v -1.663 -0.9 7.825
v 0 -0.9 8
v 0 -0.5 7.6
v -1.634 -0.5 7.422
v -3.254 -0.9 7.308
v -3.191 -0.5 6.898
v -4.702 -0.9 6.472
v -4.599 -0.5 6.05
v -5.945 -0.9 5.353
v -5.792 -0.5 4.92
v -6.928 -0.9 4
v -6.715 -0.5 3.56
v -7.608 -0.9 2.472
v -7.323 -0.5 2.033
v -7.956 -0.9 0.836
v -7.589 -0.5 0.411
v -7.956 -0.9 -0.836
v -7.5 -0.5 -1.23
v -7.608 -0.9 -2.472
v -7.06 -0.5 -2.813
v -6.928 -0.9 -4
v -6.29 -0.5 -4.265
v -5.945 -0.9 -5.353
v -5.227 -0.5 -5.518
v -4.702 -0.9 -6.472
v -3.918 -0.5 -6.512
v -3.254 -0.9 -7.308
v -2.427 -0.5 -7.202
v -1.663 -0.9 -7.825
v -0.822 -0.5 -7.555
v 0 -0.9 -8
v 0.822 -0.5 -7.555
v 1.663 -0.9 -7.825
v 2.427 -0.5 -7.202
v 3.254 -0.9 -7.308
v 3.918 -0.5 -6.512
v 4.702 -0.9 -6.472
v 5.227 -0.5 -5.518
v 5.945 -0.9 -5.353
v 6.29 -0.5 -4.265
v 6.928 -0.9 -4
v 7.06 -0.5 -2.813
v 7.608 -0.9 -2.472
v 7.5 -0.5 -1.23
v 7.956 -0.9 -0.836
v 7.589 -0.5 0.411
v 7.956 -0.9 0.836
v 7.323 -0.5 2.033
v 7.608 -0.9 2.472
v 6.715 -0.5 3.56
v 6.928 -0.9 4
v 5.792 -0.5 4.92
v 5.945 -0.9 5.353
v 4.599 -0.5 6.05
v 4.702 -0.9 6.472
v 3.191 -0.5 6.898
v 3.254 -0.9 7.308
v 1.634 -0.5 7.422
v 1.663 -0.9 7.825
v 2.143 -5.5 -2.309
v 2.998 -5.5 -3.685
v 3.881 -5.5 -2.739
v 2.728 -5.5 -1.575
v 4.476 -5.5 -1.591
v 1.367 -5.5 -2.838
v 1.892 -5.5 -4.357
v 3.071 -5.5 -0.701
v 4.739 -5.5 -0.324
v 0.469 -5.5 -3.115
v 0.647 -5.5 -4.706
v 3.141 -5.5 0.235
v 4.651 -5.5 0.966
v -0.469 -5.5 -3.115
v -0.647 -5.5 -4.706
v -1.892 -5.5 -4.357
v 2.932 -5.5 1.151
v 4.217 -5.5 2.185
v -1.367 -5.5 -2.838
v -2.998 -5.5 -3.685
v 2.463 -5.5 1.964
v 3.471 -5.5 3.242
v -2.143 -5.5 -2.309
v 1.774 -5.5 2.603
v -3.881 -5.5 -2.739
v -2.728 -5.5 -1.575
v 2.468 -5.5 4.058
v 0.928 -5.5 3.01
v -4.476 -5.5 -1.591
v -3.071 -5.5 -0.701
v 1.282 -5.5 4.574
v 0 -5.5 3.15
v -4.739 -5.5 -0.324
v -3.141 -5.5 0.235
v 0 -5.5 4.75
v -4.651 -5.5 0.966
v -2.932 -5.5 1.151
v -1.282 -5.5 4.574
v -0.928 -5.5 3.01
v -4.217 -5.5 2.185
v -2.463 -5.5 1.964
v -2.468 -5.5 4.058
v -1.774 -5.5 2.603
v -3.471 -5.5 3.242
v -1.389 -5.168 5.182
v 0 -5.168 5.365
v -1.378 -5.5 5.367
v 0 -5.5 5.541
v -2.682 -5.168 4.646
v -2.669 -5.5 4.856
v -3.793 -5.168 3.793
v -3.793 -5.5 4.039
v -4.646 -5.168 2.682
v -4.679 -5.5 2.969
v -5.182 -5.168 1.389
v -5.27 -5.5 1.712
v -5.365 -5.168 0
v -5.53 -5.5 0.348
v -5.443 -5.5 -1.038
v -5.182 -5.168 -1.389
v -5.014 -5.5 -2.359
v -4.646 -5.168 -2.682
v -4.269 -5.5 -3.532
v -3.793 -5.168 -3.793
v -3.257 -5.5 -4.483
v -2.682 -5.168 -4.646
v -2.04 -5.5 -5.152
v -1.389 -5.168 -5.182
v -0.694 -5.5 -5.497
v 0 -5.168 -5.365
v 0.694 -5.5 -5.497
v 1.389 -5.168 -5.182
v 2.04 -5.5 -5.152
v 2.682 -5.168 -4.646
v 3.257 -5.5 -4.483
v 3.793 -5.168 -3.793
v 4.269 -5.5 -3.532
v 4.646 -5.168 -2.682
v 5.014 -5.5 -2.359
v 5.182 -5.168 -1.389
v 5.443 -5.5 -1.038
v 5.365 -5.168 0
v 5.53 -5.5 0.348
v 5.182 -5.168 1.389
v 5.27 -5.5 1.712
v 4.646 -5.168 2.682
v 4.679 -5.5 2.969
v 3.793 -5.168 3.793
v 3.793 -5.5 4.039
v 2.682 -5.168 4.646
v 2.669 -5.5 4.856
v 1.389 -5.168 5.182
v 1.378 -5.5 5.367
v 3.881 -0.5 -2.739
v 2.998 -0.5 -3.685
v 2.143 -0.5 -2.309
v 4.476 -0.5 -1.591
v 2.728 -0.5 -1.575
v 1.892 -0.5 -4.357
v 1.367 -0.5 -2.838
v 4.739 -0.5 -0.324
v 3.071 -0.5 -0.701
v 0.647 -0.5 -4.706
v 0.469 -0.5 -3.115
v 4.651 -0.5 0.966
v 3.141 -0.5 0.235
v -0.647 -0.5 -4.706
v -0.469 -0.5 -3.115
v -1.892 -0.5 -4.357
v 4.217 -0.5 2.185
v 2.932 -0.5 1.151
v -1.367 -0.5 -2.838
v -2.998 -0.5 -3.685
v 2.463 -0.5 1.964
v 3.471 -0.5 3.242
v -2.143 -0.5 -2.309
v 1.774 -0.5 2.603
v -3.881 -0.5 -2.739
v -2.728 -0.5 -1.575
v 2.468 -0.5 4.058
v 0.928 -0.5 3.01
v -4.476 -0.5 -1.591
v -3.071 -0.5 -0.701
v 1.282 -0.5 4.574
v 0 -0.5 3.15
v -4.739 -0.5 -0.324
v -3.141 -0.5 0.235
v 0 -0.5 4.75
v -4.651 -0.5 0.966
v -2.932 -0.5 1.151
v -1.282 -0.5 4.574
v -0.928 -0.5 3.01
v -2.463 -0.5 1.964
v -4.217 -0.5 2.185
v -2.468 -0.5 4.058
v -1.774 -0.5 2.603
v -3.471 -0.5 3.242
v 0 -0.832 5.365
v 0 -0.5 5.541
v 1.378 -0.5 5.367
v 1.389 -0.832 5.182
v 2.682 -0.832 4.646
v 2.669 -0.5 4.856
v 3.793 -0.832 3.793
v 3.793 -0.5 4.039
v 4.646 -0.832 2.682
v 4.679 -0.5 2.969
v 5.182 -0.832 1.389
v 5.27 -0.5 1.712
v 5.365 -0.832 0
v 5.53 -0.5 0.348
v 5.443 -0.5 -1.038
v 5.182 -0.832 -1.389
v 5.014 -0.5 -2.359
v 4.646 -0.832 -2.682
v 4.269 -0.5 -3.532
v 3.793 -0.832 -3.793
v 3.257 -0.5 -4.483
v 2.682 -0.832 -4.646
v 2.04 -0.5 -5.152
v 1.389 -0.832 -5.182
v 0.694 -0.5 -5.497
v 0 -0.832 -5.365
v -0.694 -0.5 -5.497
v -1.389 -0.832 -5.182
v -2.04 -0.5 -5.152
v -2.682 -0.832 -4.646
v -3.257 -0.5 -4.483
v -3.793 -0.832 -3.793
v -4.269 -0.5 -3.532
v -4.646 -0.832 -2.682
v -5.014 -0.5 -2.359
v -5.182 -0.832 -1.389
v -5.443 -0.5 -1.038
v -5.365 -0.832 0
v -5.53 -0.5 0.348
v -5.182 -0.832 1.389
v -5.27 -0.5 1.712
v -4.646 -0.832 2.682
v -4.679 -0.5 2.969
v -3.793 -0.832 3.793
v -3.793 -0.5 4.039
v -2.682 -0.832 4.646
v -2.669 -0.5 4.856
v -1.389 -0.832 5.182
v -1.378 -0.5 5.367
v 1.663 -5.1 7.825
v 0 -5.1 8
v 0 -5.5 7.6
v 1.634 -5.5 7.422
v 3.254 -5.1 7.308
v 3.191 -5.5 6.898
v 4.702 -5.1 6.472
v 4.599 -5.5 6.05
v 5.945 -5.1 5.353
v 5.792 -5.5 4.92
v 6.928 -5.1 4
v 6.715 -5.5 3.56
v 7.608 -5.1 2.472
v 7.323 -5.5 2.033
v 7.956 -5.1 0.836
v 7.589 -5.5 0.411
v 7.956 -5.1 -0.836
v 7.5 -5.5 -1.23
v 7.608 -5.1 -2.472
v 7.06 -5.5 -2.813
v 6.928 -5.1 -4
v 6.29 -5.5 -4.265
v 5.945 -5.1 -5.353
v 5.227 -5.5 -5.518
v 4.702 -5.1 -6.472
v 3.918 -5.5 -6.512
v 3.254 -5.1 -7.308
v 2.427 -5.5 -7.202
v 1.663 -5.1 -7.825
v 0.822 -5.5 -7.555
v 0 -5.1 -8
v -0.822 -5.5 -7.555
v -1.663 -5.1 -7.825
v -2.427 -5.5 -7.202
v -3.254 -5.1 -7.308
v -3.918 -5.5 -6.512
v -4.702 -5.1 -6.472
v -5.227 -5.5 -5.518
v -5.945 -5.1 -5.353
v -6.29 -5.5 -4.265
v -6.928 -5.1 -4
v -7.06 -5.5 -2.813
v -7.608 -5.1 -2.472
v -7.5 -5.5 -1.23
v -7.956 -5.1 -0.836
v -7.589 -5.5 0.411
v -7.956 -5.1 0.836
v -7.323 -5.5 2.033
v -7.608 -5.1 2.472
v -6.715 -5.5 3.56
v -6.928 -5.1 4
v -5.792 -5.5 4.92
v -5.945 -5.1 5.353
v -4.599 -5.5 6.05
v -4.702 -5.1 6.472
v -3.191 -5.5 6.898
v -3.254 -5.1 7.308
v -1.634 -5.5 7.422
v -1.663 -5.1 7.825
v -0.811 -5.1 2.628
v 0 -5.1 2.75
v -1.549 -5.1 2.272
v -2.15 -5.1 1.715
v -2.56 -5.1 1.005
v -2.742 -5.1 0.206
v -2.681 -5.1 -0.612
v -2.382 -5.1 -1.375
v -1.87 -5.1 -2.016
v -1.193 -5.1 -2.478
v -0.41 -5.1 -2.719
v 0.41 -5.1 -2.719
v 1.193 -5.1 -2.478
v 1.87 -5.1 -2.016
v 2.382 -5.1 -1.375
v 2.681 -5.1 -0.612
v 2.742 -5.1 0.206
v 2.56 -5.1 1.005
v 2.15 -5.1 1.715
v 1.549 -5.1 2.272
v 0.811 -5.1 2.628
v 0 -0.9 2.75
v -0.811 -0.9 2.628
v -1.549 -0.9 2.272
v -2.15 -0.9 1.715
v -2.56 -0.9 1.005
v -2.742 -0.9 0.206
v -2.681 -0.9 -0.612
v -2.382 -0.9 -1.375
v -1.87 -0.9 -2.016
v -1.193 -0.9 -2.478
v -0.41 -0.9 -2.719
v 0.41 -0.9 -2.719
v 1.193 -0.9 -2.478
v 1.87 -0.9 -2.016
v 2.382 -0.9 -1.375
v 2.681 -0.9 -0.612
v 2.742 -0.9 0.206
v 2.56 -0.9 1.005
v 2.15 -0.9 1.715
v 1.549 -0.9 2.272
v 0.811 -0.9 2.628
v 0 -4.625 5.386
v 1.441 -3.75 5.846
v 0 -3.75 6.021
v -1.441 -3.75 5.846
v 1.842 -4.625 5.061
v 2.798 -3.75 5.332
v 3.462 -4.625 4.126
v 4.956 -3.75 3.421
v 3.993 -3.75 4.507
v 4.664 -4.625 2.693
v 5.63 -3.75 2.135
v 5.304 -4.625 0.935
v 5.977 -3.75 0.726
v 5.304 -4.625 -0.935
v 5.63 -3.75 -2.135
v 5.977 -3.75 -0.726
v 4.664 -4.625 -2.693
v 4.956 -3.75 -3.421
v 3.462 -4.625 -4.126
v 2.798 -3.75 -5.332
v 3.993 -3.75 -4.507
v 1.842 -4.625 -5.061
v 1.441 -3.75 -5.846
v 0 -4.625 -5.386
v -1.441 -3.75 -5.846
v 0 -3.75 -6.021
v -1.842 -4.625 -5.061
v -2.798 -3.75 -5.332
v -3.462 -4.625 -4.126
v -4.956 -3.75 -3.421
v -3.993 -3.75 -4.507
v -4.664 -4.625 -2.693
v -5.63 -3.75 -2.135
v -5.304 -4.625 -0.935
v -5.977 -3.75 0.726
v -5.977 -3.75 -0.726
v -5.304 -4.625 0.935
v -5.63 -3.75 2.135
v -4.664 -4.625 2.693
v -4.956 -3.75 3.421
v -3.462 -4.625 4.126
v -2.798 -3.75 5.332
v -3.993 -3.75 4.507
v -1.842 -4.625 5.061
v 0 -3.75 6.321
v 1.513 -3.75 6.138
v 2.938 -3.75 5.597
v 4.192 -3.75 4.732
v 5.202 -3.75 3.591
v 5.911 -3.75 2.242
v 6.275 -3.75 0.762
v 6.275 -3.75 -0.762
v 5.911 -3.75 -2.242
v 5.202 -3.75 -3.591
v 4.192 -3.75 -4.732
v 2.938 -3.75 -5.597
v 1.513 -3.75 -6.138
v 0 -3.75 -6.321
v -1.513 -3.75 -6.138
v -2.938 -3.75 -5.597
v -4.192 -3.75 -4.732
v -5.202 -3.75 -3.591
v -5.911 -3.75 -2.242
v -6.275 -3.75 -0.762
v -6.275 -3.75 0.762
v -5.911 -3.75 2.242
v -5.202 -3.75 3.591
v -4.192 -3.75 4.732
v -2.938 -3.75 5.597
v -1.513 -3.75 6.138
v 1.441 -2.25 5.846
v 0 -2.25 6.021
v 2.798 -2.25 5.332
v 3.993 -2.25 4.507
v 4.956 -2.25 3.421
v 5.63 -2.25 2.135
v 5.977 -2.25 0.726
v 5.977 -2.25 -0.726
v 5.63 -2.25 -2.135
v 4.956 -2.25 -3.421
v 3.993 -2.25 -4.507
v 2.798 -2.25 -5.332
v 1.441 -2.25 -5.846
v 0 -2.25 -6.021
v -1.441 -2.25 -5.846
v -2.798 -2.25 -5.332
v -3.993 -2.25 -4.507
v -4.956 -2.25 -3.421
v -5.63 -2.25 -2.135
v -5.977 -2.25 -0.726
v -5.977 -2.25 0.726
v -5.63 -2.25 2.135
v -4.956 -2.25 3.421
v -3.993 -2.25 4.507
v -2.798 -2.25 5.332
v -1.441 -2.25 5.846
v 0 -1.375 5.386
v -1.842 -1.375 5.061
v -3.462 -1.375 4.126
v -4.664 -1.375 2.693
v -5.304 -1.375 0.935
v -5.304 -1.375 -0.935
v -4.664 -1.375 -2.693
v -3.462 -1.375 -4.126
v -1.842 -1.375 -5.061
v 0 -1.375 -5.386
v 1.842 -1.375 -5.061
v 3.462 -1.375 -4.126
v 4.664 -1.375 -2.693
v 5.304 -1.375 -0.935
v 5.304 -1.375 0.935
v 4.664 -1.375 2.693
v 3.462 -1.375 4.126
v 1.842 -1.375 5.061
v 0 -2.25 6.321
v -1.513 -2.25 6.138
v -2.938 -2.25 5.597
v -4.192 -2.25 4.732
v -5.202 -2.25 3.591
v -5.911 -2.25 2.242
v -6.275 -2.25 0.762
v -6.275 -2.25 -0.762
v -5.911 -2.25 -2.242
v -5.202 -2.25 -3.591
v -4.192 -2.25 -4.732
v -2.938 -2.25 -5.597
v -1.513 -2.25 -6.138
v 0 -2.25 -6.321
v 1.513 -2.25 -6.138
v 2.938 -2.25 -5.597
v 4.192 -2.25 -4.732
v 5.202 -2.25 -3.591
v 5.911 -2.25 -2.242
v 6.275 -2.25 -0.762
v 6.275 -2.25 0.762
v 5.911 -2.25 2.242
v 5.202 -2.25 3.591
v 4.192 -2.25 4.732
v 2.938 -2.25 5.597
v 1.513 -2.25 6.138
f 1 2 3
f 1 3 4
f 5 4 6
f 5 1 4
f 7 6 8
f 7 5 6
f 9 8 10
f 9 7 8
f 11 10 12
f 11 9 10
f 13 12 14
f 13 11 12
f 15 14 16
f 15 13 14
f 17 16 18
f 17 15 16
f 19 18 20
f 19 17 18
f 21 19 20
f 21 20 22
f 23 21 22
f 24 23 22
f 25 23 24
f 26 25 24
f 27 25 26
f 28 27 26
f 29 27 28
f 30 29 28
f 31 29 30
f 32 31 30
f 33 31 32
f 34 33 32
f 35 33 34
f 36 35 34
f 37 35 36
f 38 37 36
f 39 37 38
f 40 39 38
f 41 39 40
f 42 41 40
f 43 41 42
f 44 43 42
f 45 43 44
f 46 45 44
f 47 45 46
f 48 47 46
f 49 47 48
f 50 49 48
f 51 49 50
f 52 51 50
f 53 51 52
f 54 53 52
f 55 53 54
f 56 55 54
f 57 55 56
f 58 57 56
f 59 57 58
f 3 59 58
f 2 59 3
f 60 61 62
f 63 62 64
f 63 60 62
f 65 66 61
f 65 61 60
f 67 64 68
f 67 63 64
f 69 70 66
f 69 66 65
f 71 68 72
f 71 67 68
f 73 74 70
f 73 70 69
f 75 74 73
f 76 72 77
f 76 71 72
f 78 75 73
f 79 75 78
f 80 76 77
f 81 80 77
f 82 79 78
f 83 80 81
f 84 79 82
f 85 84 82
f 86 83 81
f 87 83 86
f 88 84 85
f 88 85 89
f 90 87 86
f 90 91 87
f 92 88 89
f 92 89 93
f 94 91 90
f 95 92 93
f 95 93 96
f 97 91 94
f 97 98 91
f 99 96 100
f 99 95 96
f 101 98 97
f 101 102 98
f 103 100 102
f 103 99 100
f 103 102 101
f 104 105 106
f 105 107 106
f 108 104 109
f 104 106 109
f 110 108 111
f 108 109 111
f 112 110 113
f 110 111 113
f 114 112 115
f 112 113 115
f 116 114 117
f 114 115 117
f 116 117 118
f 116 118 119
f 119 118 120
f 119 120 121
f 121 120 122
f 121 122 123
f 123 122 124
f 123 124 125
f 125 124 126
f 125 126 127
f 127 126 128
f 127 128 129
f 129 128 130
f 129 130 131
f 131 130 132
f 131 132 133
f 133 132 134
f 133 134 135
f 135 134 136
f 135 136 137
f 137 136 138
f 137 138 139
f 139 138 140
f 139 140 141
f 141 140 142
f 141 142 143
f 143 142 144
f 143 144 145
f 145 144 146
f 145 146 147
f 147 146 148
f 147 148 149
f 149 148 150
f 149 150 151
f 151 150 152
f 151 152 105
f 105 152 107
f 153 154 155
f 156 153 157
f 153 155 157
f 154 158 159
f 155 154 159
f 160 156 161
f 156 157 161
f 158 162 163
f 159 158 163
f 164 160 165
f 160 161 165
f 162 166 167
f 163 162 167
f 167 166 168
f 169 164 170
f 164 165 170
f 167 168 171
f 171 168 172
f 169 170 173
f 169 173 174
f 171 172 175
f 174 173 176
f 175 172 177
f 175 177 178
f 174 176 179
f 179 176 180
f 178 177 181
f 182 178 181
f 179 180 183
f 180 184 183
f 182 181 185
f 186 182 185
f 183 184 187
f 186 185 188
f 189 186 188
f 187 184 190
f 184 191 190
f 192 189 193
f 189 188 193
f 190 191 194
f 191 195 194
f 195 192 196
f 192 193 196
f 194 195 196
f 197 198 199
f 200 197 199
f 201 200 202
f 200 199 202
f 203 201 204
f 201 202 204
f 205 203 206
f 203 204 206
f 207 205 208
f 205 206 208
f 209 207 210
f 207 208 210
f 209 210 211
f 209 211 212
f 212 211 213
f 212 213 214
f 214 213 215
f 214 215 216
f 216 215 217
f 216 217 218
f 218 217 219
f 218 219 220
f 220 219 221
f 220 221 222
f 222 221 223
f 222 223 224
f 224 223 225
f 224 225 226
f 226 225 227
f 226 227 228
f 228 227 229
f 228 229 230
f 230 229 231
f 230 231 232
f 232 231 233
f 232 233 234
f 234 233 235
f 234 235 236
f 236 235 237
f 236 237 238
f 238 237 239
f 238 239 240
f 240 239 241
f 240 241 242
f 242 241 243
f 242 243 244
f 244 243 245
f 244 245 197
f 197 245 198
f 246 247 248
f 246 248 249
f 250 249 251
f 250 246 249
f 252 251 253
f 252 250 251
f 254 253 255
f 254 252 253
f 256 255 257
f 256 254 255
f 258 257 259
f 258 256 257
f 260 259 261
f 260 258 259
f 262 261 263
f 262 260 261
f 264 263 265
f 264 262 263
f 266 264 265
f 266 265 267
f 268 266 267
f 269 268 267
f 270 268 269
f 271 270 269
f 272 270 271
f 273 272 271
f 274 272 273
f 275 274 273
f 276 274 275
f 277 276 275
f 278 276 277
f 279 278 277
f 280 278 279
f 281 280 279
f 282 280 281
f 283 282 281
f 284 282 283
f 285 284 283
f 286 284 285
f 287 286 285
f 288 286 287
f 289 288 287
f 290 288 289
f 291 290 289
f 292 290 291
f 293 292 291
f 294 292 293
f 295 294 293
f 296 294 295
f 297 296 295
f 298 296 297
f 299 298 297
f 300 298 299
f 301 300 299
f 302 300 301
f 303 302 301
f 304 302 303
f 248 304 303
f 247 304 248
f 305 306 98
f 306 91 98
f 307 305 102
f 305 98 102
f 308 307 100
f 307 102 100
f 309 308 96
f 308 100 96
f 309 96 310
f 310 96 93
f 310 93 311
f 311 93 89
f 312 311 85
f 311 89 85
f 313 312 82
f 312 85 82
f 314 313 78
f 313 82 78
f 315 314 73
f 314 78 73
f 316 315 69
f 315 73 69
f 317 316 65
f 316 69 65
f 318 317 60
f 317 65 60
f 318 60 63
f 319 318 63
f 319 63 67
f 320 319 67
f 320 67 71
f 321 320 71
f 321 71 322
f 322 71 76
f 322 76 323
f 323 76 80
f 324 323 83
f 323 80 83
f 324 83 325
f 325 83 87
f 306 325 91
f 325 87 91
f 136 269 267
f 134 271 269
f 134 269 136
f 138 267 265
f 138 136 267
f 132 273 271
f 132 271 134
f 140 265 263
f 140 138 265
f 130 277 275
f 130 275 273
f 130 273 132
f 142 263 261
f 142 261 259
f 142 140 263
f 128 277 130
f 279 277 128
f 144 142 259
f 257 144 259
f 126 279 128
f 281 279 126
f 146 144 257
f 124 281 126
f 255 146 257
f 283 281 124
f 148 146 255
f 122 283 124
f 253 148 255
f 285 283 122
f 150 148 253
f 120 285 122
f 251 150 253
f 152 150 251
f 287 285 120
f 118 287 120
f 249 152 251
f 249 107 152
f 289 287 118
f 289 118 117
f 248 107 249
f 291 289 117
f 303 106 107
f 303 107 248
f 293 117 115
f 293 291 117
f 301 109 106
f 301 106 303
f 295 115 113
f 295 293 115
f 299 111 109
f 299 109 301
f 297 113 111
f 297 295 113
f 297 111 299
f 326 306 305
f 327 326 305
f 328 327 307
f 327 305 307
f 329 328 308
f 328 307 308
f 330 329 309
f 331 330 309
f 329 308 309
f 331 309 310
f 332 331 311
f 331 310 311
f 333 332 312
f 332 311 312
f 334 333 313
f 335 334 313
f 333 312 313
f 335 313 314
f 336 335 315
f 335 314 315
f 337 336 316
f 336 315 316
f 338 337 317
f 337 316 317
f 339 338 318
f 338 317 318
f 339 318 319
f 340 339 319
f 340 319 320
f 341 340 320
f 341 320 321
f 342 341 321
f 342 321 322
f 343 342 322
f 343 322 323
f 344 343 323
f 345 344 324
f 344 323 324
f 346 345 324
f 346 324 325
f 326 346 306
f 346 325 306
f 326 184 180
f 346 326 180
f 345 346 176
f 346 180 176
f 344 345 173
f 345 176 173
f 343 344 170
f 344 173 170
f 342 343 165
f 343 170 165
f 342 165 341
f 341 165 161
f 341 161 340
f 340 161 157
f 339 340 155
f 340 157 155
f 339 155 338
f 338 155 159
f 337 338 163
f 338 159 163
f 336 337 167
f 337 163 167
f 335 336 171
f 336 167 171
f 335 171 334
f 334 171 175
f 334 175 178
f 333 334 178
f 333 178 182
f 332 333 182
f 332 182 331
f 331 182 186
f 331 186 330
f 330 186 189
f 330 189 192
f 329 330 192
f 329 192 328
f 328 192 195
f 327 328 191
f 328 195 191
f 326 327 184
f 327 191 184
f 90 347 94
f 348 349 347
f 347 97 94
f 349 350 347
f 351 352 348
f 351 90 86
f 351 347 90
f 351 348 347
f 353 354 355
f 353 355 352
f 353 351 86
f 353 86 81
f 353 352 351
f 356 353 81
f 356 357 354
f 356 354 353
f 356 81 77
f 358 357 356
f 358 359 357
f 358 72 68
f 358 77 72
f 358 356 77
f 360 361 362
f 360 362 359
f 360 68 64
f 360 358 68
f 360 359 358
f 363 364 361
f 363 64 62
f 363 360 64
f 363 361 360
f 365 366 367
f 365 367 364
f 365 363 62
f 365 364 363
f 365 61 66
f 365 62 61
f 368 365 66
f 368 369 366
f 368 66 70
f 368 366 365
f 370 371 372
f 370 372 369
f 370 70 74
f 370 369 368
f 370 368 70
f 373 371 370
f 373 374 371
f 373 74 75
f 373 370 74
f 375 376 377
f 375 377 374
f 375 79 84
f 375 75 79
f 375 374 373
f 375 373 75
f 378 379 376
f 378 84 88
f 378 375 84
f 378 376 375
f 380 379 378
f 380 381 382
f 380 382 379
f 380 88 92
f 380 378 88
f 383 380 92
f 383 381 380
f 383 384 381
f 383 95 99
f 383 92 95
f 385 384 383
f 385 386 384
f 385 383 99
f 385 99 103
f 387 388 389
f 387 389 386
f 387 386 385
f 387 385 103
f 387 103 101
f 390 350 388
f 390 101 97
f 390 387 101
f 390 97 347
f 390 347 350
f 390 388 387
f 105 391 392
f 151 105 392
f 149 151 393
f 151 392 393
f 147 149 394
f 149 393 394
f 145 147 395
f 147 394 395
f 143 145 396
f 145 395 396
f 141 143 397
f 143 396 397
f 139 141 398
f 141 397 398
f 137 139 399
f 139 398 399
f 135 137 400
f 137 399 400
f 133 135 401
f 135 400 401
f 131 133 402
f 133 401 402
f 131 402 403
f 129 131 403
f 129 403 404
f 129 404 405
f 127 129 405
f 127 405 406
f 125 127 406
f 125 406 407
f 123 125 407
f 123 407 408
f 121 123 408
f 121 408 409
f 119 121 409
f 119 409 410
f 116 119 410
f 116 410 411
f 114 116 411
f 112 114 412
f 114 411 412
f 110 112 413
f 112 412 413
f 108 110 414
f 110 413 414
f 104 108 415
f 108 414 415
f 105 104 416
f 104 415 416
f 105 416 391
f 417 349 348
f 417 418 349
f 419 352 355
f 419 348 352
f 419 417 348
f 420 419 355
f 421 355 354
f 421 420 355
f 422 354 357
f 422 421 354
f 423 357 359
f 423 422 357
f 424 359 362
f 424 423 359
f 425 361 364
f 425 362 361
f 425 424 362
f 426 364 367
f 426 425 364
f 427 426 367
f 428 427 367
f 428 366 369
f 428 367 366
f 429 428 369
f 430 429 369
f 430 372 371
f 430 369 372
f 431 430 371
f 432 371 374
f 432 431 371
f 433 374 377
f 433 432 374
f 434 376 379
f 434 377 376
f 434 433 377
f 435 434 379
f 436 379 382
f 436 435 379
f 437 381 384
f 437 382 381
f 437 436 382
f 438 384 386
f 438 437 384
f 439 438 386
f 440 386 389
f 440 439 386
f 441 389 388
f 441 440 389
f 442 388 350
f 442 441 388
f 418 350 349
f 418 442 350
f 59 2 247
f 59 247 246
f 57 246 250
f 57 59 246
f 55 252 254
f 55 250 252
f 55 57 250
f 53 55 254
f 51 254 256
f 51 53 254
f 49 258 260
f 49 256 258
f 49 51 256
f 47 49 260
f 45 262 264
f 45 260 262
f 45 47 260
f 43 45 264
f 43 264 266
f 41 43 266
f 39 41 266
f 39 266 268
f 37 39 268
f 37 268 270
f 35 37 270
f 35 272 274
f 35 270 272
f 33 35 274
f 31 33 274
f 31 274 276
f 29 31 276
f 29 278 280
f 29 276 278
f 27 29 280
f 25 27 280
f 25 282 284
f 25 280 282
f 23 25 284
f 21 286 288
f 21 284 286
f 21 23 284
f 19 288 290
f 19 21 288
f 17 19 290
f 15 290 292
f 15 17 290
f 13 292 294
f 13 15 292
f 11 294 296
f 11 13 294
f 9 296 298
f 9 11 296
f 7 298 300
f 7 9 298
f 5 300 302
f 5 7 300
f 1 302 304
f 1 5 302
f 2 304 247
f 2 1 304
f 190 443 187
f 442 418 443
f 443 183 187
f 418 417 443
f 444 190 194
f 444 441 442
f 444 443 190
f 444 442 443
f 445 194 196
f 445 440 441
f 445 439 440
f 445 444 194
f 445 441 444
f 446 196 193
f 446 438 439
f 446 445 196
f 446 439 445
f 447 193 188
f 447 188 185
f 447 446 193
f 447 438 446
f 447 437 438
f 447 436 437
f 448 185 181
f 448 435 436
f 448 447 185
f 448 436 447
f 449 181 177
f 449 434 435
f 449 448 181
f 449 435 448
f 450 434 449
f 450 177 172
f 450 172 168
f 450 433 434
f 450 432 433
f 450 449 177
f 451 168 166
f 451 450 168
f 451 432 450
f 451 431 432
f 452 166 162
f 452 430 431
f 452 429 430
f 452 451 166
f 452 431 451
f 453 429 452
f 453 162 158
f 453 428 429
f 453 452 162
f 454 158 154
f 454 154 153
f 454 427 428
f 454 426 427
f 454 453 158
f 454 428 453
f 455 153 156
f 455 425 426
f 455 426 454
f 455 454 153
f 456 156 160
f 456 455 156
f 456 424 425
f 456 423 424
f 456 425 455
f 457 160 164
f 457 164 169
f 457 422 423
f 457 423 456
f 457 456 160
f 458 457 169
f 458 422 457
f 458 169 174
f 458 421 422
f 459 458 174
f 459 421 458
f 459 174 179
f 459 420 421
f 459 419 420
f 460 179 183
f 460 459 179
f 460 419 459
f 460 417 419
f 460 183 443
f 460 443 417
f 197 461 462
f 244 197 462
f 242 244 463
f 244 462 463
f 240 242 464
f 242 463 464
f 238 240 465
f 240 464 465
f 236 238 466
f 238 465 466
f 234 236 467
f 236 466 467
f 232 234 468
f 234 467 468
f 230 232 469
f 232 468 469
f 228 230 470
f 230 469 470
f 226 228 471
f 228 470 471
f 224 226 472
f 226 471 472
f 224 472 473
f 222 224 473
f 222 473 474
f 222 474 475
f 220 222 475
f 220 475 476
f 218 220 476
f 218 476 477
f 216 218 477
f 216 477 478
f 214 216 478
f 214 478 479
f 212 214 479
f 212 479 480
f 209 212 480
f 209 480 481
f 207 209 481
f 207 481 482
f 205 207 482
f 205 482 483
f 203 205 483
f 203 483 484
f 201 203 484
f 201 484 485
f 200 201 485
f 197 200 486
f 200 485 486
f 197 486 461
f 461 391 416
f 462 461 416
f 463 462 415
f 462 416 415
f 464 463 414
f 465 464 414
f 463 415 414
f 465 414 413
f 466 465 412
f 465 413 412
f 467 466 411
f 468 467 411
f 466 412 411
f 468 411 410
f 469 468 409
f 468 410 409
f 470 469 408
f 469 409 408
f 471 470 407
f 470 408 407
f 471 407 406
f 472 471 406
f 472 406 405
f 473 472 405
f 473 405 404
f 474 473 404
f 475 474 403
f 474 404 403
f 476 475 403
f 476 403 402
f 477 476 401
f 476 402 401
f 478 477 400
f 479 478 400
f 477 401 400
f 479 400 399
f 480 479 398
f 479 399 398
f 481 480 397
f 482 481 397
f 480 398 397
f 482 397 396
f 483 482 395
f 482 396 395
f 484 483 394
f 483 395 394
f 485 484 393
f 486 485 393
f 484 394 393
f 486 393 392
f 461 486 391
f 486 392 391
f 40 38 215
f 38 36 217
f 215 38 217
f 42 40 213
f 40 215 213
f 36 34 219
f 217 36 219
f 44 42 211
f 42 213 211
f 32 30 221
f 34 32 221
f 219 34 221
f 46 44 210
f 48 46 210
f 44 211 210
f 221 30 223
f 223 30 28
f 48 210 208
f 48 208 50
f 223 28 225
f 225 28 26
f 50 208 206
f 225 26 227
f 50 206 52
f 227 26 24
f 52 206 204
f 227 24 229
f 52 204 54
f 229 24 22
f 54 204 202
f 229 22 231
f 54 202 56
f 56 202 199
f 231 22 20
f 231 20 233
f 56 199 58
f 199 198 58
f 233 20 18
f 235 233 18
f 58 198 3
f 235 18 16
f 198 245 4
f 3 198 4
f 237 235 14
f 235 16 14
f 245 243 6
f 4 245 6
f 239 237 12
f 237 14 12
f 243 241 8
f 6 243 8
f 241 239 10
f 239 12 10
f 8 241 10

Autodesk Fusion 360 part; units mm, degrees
sketch "Skizze1" plane through (0, 0, 0) normal (1, 0, 0) x (0, 0, -1)
  line L0 (-2.75, -0.5) -> (-2.75, -5.5)
  line L1 (-8, -5.5) -> (-8, -0.5)
  line L2 (-5.1411, -0.5) -> (-6.3214, -2.25)
  line L3 (-6.3214, -2.25) -> (-6.3214, -3.75)
  line L4 (-6.3214, -3.75) -> (-5.1411, -5.5)
  line L5 (-6.0214, -3.75) -> (-6.0214, -2.25)
  line L6 (-6.0214, -2.25) -> (-4.75, -0.5)
  line L7 (-2.75, -5.5) -> (-4.75, -5.5)
  line L8 (-5.1411, -5.5) -> (-8, -5.5)
  line L9 (-8, -0.5) -> (-5.1411, -0.5)
  line L10 (-4.75, -0.5) -> (-2.75, -0.5)
  line L11 (-6.0214, -3.75) -> (-4.75, -5.5)
  line L12 (0, 0) -> (0, -7.2054)
  dimension "d2" = 2.75
  dimension "d3" = 5
  dimension "d4" = 8
  dimension "d5" = 1.5
  dimension "d6" = 1.5
  dimension "d7" = 1.75
  dimension "d8" = 1.75
  dimension "d9" = 56
  dimension "d10" = 56
  dimension "d11" = 0.3
  dimension "d12" = 54
  dimension "d14" = 54
  dimension "d15" = 1.5714
  dimension "d20" = 2
revolve "Drehen1" add sketch "Skizze1" angle 360 about axis through (0, 0, 0) along (0, -1, 0) makes body 1 at (0.3988, -3.8333, 7.9901) makes body 2 at (0.2738, -2.1667, 2.7363)
chamfer "Fase1" distance 0.4 angle 45 6 edges at (-2.5639, -0.5, 0.9944) (-2.5639, -5.5, 0.9944) (-4.7932, -0.5, 1.8591) (-7.4586, -0.5, 2.8929) (-7.4586, -5.5, 2.8929) (-4.7932, -5.5, 1.8591) on bodies 1 2
equation "d2 = ( 5.5 / 2 ) * 1 mm"
equation "d4 = ( 16 / 2 ) * 1 mm"
equation "d6 = d5"
equation "d7 = ( d3 - d5 ) / 2"
equation "d8 = d7"
equation "d10 = d9"
equation "d14 = d12"
